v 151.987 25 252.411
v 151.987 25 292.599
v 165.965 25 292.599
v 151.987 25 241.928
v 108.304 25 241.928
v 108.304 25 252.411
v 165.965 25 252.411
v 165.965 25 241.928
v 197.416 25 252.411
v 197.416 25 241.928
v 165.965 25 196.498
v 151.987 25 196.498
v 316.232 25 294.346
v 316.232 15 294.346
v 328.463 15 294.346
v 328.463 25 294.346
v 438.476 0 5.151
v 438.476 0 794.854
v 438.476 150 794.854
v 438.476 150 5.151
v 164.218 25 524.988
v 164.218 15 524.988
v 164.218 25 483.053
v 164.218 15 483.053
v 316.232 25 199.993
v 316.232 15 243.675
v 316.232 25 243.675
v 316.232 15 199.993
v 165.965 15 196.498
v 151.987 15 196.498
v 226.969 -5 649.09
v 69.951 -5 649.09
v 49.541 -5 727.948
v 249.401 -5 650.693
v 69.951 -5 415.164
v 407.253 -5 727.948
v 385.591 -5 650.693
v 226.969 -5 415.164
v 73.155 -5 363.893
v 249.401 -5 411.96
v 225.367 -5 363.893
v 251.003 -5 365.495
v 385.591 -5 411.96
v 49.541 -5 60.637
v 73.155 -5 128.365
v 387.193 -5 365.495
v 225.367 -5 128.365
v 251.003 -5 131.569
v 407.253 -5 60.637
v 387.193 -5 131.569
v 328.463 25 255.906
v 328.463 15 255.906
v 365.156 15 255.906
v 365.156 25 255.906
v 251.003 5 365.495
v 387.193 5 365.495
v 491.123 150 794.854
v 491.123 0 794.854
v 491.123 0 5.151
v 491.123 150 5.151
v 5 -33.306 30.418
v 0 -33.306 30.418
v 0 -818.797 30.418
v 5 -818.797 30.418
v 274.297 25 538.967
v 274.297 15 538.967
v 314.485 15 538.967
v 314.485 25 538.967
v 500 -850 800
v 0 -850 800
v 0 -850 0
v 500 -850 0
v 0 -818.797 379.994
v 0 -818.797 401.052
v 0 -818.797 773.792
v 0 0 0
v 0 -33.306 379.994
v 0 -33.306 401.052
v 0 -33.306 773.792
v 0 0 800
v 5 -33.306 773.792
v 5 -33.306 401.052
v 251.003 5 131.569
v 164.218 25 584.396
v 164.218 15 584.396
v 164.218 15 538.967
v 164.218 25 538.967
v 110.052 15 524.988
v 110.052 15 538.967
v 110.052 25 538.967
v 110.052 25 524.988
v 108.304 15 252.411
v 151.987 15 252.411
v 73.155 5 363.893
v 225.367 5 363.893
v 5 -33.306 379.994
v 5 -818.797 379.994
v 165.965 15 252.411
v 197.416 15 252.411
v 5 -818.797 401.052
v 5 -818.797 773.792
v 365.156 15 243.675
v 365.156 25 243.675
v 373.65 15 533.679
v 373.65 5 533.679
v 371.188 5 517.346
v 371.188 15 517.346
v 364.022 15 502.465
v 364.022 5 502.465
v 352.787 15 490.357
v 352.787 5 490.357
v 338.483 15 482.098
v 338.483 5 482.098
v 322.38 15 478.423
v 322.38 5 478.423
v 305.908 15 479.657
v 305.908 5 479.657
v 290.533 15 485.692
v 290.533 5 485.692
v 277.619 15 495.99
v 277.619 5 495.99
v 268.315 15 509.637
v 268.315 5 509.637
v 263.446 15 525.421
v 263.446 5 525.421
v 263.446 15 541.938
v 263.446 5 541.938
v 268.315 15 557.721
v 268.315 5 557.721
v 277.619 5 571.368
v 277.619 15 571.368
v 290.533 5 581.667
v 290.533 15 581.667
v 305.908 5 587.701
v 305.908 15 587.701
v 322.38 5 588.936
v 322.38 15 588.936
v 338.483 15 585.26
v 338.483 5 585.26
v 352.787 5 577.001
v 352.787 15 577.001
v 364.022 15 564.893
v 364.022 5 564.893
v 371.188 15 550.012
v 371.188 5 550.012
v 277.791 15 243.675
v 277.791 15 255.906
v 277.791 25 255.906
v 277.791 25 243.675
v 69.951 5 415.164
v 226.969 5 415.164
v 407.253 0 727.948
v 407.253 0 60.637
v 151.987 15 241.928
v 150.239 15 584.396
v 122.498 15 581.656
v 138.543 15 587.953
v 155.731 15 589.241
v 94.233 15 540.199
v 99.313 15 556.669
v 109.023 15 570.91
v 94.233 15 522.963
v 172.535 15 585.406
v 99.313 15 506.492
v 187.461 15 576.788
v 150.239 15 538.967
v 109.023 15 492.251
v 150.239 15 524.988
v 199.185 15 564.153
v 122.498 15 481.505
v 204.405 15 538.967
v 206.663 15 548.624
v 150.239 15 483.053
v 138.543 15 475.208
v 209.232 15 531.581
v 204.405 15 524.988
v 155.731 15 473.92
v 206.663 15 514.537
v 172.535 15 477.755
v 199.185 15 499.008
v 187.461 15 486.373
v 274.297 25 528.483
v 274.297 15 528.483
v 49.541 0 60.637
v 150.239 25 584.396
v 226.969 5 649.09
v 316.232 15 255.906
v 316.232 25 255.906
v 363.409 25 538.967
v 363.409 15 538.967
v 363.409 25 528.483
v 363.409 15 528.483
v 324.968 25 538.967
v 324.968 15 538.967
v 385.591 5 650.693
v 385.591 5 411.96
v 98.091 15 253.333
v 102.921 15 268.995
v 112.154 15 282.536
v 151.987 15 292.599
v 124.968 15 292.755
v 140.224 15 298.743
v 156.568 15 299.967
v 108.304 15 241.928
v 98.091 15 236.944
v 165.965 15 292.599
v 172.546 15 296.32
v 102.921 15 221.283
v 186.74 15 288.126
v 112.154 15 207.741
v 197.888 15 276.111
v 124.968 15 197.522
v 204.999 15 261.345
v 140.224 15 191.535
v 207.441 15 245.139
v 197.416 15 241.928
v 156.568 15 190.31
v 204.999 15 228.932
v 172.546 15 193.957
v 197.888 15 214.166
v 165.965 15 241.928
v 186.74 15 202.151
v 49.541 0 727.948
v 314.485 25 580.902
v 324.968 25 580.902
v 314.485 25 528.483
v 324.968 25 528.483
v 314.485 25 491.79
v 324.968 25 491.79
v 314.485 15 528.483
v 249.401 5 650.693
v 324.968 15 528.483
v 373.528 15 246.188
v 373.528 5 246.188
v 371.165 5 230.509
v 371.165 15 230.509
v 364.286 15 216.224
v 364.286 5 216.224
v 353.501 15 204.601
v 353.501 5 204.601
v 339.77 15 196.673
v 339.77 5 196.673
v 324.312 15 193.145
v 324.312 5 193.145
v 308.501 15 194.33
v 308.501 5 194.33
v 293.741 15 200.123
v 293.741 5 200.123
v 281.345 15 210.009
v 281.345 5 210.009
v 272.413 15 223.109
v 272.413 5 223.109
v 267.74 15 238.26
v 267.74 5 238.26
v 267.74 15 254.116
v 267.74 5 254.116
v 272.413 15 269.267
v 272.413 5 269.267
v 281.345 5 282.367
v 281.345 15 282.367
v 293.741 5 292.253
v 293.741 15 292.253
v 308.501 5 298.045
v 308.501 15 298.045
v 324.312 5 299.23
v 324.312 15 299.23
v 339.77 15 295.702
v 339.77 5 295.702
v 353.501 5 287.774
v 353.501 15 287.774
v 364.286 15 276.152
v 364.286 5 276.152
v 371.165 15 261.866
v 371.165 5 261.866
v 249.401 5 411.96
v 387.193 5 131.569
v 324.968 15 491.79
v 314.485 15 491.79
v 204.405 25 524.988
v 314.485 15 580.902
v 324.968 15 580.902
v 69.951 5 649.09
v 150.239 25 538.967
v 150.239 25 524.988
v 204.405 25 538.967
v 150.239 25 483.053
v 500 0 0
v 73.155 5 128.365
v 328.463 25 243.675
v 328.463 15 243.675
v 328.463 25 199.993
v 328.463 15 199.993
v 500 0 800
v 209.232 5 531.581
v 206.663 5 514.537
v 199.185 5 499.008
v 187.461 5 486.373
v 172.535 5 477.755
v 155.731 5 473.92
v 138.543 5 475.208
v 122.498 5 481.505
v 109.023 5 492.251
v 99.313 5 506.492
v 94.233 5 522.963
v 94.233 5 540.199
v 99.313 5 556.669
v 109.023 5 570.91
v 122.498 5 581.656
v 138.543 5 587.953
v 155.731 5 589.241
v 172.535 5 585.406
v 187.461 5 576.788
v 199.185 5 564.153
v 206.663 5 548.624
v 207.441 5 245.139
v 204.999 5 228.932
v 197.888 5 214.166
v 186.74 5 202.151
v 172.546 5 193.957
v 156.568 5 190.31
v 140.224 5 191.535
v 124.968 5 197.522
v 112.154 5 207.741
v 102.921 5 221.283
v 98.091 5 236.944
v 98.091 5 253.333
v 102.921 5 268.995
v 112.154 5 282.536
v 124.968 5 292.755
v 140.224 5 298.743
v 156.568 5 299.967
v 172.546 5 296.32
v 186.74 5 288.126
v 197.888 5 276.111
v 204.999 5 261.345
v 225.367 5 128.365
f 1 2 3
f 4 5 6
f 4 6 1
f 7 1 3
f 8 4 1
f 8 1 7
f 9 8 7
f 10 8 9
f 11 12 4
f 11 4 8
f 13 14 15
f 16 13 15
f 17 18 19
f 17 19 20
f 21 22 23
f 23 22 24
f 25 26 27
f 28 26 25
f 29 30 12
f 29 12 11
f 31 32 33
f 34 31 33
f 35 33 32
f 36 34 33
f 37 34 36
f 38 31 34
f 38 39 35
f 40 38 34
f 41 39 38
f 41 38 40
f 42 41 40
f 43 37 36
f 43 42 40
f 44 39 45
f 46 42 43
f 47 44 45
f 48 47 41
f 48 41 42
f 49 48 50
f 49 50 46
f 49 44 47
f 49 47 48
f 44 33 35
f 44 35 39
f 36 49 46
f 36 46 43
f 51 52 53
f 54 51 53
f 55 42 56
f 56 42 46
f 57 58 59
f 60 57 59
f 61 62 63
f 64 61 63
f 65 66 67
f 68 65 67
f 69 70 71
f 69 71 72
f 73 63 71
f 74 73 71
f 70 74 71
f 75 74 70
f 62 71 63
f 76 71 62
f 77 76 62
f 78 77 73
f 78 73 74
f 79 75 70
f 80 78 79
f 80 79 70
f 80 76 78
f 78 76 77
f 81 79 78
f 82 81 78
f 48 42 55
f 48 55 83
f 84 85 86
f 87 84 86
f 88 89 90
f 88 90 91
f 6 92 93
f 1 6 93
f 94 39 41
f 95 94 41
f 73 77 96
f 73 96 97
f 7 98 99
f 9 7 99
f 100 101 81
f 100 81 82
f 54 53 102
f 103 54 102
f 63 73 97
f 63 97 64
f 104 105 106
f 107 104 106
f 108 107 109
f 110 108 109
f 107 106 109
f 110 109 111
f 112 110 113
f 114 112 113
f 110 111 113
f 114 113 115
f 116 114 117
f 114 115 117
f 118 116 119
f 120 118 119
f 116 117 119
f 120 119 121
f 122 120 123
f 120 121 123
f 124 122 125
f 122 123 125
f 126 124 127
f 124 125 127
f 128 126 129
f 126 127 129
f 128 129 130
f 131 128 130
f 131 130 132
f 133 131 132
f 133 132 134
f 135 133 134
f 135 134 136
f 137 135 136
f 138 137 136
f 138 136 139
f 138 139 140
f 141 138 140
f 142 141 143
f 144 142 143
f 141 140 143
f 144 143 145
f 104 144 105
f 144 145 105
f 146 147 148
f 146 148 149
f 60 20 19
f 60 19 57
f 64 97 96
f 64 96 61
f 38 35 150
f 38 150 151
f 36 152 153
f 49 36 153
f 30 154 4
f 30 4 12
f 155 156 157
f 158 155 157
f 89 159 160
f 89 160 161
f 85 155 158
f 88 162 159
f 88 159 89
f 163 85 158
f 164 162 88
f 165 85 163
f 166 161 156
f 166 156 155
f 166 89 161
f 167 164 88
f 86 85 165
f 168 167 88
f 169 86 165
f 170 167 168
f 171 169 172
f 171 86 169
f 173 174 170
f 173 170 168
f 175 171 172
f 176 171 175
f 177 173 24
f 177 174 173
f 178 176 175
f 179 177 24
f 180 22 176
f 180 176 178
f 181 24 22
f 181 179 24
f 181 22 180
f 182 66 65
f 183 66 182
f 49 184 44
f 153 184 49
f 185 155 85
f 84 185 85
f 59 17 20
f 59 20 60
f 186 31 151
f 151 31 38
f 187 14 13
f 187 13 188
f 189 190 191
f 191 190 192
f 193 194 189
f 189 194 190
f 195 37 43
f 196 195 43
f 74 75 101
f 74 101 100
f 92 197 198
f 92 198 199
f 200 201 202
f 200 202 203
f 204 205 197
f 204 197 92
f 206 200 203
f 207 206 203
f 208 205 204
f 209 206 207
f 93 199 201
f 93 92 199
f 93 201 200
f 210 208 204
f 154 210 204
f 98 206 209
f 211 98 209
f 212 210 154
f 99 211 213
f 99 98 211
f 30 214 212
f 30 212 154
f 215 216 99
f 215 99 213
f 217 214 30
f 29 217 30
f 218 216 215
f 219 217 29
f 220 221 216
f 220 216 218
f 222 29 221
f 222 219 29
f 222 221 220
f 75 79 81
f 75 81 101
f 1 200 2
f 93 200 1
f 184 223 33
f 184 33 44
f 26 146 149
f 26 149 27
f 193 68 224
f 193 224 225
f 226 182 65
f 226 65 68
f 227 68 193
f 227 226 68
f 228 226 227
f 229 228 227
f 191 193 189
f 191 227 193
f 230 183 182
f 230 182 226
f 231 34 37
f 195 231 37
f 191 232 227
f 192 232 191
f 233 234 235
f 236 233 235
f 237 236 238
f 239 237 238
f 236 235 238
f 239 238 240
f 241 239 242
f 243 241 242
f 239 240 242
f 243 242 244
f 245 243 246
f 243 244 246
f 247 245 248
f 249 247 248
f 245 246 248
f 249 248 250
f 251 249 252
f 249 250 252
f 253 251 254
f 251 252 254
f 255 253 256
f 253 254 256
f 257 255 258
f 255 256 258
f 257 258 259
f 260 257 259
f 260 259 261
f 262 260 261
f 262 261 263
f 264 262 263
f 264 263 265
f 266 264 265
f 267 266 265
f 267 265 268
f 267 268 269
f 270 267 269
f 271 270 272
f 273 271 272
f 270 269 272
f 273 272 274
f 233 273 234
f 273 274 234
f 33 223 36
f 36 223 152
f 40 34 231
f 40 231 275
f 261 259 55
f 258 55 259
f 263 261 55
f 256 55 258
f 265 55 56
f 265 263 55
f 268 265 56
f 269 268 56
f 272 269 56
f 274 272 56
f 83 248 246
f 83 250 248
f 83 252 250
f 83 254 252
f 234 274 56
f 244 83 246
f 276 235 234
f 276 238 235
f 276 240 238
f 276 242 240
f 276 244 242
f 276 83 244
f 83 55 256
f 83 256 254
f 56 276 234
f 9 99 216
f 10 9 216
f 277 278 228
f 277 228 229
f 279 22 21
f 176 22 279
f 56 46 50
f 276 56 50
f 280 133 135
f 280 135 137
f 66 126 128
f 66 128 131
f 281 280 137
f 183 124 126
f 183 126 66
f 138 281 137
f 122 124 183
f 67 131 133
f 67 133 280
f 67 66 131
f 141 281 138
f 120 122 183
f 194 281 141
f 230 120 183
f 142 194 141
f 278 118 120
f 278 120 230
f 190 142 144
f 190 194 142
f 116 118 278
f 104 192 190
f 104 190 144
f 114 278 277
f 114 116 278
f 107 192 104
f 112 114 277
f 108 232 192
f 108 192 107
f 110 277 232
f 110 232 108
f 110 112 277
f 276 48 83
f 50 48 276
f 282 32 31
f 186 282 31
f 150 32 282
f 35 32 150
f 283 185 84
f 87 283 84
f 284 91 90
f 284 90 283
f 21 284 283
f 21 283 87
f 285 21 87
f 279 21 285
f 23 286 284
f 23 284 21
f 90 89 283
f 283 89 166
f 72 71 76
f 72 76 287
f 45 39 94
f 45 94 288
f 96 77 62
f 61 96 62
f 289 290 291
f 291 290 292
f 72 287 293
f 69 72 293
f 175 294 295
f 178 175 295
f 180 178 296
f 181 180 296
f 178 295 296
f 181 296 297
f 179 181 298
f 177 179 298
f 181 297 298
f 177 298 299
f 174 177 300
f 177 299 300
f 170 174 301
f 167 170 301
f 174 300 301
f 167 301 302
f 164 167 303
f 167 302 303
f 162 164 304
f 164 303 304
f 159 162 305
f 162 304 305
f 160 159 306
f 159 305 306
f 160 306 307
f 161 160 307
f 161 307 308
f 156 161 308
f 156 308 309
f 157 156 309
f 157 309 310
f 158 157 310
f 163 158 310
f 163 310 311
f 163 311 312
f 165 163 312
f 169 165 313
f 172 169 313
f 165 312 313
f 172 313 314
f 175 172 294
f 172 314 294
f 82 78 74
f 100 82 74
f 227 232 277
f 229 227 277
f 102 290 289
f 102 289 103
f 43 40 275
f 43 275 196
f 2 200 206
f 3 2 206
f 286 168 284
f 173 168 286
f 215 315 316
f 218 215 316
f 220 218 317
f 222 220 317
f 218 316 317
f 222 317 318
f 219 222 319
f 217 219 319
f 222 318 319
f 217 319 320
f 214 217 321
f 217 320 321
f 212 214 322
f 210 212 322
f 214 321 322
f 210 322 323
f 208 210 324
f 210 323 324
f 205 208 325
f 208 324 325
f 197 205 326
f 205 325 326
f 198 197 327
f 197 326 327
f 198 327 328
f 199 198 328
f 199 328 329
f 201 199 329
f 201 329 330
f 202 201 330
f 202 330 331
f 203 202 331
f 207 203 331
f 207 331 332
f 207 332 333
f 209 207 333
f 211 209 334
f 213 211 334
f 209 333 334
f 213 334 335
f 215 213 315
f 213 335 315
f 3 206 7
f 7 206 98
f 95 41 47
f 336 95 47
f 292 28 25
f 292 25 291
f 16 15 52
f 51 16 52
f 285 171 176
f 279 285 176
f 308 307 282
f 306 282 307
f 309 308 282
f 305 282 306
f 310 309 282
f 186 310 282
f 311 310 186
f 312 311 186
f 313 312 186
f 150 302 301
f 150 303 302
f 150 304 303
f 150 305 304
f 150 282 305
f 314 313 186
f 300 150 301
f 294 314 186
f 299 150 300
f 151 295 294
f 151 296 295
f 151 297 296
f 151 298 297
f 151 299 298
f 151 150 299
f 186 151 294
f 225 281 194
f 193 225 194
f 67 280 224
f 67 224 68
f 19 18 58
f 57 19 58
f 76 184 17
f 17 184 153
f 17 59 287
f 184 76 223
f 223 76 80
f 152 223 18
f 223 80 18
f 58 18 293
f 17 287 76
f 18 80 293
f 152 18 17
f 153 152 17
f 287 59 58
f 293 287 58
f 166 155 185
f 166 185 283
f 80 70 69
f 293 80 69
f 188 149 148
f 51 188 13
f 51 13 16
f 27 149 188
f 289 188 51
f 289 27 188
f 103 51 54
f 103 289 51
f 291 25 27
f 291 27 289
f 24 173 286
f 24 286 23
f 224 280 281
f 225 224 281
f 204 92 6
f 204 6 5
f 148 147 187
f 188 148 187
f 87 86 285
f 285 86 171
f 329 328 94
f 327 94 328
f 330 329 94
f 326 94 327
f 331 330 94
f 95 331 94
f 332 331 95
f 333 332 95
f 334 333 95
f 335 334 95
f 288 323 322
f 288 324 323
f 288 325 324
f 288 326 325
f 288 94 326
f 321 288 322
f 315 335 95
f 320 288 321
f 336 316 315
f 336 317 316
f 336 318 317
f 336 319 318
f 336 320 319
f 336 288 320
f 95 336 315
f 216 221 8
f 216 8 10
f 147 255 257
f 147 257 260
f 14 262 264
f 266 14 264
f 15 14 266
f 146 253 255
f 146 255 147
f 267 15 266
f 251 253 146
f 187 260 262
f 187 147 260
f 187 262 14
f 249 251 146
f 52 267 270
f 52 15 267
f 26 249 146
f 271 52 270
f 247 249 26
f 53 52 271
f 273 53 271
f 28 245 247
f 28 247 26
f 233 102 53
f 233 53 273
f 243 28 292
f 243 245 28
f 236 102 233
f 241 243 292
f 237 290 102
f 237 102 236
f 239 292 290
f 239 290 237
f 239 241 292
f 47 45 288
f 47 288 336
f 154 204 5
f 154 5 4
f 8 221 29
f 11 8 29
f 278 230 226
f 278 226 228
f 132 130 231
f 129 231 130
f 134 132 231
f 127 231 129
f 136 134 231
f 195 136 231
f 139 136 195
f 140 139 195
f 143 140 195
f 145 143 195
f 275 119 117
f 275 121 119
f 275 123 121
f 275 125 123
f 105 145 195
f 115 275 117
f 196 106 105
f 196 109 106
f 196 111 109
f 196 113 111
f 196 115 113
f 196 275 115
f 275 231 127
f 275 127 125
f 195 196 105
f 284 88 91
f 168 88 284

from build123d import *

# Parameters (mm, degrees)
SKETCH_W        = 500
SKETCH_H        = 800
PAD_DEPTH       = 850
SKETCH001_W     = 372.739898
SKETCH001_H     = 785.491455
SKETCH001_W_2   = 349.575272
SKETCH001_H_2   = 785.491421
POCKET_DEPTH    = 5
SKETCH002_W     = 52.646911
SKETCH002_H     = 789.7032
PAD001_DEPTH    = 150
SKETCH003_W     = 357.712269
SKETCH003_H     = 667.311138
POCKET001_DEPTH = 5
SKETCH004_W     = 152.212128
SKETCH004_H     = 235.528305
SKETCH004_W_2   = 136.189866
SKETCH004_H_2   = 233.926148
SKETCH004_W_3   = 157.018867
SKETCH004_H_3   = 233.926025
SKETCH004_W_4   = 136.189834
SKETCH004_H_4   = 238.732727
PAD002_DEPTH    = 10
SKETCH005_R     = 54.982504
SKETCH005_R_2   = 53.191284
SKETCH005_R_3   = 57.822478
SKETCH005_R_4   = 55.41133
PAD003_DEPTH    = 10
SKETCH006_W     = 89.111725
SKETCH006_H     = 10.483764
SKETCH006_W_2   = 87.364411
SKETCH006_H_2   = 12.231064
SKETCH006_W_3   = 94.353591
SKETCH006_H_3   = 13.978333
SKETCH006_H_4   = 10.483765
SKETCH006_W_4   = 13.978317
SKETCH006_H_5   = 96.100876
SKETCH006_W_5   = 12.230988
SKETCH006_H_6   = 94.353622
SKETCH006_H_7   = 101.342773
SKETCH006_W_6   = 10.483643
SKETCH006_H_8   = 89.111755
PAD004_DEPTH    = 10


with BuildPart() as part:
    # Sketch → Pad (new body)
    with BuildSketch(Plane.XZ):
        with Locations((250, 400)):
            Rectangle(SKETCH_W, SKETCH_H)
    extrude(amount=PAD_DEPTH)

    # Sketch001 (on Face4 of Pad) → Pocket (cut)
    with BuildSketch(Plane(origin=(0, 0, 0), x_dir=(0, 0, -1), z_dir=(-1, 0, 0))):
        with Locations((-587.422287, 426.051728)):
            Rectangle(SKETCH001_W, SKETCH001_H)
        with Locations((-205.205925, 426.051727)):
            Rectangle(SKETCH001_W_2, SKETCH001_H_2)
    extrude(amount=-POCKET_DEPTH, mode=Mode.SUBTRACT)

    # Sketch002 (on Face4 of Pocket) → Pad001 (join)
    with BuildSketch(Plane(origin=(0, 0, 0), x_dir=(1, 0, 0), z_dir=(0, 1, 0))):
        with Locations((464.799377, -400.002709)):
            Rectangle(SKETCH002_W, SKETCH002_H)
    extrude(amount=PAD001_DEPTH)

    # Sketch003 (on Face4 of Pad001) → Pocket001 (cut)
    with BuildSketch(Plane(origin=(0, 0, 0), x_dir=(1, 0, 0), z_dir=(0, 1, 0))):
        with Locations((228.396917, -394.292307)):
            Rectangle(SKETCH003_W, SKETCH003_H)
    extrude(amount=-POCKET001_DEPTH, mode=Mode.SUBTRACT)

    # Sketch004 (on Face25 of Pocket001) → Pad002 (join)
    with BuildSketch(Plane(origin=(0, -5, 0), x_dir=(1, 0, 0), z_dir=(0, 1, 0))):
        with Locations((149.261093, -246.12873)):
            Rectangle(SKETCH004_W, SKETCH004_H)
        with Locations((319.097847, -248.532074)):
            Rectangle(SKETCH004_W_2, SKETCH004_H_2)
        with Locations((148.459987, -532.12738)):
            Rectangle(SKETCH004_W_3, SKETCH004_H_3)
        with Locations((317.495598, -531.326263)):
            Rectangle(SKETCH004_W_4, SKETCH004_H_4)
    extrude(amount=PAD002_DEPTH)

    # Sketch005 (on Face43 of Pad002) → Pad003 (join)
    with BuildSketch(Plane(origin=(0, 5, 0), x_dir=(1, 0, 0), z_dir=(0, 1, 0))):
        with Locations((152.458954, -245.138535)):
            Circle(SKETCH005_R)
        with Locations((320.337128, -246.187805)):
            Circle(SKETCH005_R_2)
        with Locations((151.409729, -531.580627)):
            Circle(SKETCH005_R_3)
        with Locations((318.238647, -533.679138)):
            Circle(SKETCH005_R_4)
    extrude(amount=PAD003_DEPTH)

    # Sketch006 (on Face51 of Pad003) → Pad004 (join)
    with BuildSketch(Plane(origin=(0, 15, 0), x_dir=(1, 0, 0), z_dir=(0, 1, 0))):
        with Locations((152.860336, -247.169525)):
            Rectangle(SKETCH006_W, SKETCH006_H)
        with Locations((321.473679, -249.790474)):
            Rectangle(SKETCH006_W_2, SKETCH006_H_2)
        with Locations((157.228538, -531.977569)):
            Rectangle(SKETCH006_W_3, SKETCH006_H_3)
        with Locations((318.852737, -533.724853)):
            Rectangle(SKETCH006_W, SKETCH006_H_4)
        with Locations((158.975837, -244.548622)):
            Rectangle(SKETCH006_W_4, SKETCH006_H_5)
        with Locations((322.347336, -247.169533)):
            Rectangle(SKETCH006_W_5, SKETCH006_H_6)
        with Locations((157.228538, -533.724853)):
            Rectangle(SKETCH006_W_4, SKETCH006_H_7)
        with Locations((319.72638, -536.345795)):
            Rectangle(SKETCH006_W_6, SKETCH006_H_8)
    extrude(amount=PAD004_DEPTH)


solid = part.part
